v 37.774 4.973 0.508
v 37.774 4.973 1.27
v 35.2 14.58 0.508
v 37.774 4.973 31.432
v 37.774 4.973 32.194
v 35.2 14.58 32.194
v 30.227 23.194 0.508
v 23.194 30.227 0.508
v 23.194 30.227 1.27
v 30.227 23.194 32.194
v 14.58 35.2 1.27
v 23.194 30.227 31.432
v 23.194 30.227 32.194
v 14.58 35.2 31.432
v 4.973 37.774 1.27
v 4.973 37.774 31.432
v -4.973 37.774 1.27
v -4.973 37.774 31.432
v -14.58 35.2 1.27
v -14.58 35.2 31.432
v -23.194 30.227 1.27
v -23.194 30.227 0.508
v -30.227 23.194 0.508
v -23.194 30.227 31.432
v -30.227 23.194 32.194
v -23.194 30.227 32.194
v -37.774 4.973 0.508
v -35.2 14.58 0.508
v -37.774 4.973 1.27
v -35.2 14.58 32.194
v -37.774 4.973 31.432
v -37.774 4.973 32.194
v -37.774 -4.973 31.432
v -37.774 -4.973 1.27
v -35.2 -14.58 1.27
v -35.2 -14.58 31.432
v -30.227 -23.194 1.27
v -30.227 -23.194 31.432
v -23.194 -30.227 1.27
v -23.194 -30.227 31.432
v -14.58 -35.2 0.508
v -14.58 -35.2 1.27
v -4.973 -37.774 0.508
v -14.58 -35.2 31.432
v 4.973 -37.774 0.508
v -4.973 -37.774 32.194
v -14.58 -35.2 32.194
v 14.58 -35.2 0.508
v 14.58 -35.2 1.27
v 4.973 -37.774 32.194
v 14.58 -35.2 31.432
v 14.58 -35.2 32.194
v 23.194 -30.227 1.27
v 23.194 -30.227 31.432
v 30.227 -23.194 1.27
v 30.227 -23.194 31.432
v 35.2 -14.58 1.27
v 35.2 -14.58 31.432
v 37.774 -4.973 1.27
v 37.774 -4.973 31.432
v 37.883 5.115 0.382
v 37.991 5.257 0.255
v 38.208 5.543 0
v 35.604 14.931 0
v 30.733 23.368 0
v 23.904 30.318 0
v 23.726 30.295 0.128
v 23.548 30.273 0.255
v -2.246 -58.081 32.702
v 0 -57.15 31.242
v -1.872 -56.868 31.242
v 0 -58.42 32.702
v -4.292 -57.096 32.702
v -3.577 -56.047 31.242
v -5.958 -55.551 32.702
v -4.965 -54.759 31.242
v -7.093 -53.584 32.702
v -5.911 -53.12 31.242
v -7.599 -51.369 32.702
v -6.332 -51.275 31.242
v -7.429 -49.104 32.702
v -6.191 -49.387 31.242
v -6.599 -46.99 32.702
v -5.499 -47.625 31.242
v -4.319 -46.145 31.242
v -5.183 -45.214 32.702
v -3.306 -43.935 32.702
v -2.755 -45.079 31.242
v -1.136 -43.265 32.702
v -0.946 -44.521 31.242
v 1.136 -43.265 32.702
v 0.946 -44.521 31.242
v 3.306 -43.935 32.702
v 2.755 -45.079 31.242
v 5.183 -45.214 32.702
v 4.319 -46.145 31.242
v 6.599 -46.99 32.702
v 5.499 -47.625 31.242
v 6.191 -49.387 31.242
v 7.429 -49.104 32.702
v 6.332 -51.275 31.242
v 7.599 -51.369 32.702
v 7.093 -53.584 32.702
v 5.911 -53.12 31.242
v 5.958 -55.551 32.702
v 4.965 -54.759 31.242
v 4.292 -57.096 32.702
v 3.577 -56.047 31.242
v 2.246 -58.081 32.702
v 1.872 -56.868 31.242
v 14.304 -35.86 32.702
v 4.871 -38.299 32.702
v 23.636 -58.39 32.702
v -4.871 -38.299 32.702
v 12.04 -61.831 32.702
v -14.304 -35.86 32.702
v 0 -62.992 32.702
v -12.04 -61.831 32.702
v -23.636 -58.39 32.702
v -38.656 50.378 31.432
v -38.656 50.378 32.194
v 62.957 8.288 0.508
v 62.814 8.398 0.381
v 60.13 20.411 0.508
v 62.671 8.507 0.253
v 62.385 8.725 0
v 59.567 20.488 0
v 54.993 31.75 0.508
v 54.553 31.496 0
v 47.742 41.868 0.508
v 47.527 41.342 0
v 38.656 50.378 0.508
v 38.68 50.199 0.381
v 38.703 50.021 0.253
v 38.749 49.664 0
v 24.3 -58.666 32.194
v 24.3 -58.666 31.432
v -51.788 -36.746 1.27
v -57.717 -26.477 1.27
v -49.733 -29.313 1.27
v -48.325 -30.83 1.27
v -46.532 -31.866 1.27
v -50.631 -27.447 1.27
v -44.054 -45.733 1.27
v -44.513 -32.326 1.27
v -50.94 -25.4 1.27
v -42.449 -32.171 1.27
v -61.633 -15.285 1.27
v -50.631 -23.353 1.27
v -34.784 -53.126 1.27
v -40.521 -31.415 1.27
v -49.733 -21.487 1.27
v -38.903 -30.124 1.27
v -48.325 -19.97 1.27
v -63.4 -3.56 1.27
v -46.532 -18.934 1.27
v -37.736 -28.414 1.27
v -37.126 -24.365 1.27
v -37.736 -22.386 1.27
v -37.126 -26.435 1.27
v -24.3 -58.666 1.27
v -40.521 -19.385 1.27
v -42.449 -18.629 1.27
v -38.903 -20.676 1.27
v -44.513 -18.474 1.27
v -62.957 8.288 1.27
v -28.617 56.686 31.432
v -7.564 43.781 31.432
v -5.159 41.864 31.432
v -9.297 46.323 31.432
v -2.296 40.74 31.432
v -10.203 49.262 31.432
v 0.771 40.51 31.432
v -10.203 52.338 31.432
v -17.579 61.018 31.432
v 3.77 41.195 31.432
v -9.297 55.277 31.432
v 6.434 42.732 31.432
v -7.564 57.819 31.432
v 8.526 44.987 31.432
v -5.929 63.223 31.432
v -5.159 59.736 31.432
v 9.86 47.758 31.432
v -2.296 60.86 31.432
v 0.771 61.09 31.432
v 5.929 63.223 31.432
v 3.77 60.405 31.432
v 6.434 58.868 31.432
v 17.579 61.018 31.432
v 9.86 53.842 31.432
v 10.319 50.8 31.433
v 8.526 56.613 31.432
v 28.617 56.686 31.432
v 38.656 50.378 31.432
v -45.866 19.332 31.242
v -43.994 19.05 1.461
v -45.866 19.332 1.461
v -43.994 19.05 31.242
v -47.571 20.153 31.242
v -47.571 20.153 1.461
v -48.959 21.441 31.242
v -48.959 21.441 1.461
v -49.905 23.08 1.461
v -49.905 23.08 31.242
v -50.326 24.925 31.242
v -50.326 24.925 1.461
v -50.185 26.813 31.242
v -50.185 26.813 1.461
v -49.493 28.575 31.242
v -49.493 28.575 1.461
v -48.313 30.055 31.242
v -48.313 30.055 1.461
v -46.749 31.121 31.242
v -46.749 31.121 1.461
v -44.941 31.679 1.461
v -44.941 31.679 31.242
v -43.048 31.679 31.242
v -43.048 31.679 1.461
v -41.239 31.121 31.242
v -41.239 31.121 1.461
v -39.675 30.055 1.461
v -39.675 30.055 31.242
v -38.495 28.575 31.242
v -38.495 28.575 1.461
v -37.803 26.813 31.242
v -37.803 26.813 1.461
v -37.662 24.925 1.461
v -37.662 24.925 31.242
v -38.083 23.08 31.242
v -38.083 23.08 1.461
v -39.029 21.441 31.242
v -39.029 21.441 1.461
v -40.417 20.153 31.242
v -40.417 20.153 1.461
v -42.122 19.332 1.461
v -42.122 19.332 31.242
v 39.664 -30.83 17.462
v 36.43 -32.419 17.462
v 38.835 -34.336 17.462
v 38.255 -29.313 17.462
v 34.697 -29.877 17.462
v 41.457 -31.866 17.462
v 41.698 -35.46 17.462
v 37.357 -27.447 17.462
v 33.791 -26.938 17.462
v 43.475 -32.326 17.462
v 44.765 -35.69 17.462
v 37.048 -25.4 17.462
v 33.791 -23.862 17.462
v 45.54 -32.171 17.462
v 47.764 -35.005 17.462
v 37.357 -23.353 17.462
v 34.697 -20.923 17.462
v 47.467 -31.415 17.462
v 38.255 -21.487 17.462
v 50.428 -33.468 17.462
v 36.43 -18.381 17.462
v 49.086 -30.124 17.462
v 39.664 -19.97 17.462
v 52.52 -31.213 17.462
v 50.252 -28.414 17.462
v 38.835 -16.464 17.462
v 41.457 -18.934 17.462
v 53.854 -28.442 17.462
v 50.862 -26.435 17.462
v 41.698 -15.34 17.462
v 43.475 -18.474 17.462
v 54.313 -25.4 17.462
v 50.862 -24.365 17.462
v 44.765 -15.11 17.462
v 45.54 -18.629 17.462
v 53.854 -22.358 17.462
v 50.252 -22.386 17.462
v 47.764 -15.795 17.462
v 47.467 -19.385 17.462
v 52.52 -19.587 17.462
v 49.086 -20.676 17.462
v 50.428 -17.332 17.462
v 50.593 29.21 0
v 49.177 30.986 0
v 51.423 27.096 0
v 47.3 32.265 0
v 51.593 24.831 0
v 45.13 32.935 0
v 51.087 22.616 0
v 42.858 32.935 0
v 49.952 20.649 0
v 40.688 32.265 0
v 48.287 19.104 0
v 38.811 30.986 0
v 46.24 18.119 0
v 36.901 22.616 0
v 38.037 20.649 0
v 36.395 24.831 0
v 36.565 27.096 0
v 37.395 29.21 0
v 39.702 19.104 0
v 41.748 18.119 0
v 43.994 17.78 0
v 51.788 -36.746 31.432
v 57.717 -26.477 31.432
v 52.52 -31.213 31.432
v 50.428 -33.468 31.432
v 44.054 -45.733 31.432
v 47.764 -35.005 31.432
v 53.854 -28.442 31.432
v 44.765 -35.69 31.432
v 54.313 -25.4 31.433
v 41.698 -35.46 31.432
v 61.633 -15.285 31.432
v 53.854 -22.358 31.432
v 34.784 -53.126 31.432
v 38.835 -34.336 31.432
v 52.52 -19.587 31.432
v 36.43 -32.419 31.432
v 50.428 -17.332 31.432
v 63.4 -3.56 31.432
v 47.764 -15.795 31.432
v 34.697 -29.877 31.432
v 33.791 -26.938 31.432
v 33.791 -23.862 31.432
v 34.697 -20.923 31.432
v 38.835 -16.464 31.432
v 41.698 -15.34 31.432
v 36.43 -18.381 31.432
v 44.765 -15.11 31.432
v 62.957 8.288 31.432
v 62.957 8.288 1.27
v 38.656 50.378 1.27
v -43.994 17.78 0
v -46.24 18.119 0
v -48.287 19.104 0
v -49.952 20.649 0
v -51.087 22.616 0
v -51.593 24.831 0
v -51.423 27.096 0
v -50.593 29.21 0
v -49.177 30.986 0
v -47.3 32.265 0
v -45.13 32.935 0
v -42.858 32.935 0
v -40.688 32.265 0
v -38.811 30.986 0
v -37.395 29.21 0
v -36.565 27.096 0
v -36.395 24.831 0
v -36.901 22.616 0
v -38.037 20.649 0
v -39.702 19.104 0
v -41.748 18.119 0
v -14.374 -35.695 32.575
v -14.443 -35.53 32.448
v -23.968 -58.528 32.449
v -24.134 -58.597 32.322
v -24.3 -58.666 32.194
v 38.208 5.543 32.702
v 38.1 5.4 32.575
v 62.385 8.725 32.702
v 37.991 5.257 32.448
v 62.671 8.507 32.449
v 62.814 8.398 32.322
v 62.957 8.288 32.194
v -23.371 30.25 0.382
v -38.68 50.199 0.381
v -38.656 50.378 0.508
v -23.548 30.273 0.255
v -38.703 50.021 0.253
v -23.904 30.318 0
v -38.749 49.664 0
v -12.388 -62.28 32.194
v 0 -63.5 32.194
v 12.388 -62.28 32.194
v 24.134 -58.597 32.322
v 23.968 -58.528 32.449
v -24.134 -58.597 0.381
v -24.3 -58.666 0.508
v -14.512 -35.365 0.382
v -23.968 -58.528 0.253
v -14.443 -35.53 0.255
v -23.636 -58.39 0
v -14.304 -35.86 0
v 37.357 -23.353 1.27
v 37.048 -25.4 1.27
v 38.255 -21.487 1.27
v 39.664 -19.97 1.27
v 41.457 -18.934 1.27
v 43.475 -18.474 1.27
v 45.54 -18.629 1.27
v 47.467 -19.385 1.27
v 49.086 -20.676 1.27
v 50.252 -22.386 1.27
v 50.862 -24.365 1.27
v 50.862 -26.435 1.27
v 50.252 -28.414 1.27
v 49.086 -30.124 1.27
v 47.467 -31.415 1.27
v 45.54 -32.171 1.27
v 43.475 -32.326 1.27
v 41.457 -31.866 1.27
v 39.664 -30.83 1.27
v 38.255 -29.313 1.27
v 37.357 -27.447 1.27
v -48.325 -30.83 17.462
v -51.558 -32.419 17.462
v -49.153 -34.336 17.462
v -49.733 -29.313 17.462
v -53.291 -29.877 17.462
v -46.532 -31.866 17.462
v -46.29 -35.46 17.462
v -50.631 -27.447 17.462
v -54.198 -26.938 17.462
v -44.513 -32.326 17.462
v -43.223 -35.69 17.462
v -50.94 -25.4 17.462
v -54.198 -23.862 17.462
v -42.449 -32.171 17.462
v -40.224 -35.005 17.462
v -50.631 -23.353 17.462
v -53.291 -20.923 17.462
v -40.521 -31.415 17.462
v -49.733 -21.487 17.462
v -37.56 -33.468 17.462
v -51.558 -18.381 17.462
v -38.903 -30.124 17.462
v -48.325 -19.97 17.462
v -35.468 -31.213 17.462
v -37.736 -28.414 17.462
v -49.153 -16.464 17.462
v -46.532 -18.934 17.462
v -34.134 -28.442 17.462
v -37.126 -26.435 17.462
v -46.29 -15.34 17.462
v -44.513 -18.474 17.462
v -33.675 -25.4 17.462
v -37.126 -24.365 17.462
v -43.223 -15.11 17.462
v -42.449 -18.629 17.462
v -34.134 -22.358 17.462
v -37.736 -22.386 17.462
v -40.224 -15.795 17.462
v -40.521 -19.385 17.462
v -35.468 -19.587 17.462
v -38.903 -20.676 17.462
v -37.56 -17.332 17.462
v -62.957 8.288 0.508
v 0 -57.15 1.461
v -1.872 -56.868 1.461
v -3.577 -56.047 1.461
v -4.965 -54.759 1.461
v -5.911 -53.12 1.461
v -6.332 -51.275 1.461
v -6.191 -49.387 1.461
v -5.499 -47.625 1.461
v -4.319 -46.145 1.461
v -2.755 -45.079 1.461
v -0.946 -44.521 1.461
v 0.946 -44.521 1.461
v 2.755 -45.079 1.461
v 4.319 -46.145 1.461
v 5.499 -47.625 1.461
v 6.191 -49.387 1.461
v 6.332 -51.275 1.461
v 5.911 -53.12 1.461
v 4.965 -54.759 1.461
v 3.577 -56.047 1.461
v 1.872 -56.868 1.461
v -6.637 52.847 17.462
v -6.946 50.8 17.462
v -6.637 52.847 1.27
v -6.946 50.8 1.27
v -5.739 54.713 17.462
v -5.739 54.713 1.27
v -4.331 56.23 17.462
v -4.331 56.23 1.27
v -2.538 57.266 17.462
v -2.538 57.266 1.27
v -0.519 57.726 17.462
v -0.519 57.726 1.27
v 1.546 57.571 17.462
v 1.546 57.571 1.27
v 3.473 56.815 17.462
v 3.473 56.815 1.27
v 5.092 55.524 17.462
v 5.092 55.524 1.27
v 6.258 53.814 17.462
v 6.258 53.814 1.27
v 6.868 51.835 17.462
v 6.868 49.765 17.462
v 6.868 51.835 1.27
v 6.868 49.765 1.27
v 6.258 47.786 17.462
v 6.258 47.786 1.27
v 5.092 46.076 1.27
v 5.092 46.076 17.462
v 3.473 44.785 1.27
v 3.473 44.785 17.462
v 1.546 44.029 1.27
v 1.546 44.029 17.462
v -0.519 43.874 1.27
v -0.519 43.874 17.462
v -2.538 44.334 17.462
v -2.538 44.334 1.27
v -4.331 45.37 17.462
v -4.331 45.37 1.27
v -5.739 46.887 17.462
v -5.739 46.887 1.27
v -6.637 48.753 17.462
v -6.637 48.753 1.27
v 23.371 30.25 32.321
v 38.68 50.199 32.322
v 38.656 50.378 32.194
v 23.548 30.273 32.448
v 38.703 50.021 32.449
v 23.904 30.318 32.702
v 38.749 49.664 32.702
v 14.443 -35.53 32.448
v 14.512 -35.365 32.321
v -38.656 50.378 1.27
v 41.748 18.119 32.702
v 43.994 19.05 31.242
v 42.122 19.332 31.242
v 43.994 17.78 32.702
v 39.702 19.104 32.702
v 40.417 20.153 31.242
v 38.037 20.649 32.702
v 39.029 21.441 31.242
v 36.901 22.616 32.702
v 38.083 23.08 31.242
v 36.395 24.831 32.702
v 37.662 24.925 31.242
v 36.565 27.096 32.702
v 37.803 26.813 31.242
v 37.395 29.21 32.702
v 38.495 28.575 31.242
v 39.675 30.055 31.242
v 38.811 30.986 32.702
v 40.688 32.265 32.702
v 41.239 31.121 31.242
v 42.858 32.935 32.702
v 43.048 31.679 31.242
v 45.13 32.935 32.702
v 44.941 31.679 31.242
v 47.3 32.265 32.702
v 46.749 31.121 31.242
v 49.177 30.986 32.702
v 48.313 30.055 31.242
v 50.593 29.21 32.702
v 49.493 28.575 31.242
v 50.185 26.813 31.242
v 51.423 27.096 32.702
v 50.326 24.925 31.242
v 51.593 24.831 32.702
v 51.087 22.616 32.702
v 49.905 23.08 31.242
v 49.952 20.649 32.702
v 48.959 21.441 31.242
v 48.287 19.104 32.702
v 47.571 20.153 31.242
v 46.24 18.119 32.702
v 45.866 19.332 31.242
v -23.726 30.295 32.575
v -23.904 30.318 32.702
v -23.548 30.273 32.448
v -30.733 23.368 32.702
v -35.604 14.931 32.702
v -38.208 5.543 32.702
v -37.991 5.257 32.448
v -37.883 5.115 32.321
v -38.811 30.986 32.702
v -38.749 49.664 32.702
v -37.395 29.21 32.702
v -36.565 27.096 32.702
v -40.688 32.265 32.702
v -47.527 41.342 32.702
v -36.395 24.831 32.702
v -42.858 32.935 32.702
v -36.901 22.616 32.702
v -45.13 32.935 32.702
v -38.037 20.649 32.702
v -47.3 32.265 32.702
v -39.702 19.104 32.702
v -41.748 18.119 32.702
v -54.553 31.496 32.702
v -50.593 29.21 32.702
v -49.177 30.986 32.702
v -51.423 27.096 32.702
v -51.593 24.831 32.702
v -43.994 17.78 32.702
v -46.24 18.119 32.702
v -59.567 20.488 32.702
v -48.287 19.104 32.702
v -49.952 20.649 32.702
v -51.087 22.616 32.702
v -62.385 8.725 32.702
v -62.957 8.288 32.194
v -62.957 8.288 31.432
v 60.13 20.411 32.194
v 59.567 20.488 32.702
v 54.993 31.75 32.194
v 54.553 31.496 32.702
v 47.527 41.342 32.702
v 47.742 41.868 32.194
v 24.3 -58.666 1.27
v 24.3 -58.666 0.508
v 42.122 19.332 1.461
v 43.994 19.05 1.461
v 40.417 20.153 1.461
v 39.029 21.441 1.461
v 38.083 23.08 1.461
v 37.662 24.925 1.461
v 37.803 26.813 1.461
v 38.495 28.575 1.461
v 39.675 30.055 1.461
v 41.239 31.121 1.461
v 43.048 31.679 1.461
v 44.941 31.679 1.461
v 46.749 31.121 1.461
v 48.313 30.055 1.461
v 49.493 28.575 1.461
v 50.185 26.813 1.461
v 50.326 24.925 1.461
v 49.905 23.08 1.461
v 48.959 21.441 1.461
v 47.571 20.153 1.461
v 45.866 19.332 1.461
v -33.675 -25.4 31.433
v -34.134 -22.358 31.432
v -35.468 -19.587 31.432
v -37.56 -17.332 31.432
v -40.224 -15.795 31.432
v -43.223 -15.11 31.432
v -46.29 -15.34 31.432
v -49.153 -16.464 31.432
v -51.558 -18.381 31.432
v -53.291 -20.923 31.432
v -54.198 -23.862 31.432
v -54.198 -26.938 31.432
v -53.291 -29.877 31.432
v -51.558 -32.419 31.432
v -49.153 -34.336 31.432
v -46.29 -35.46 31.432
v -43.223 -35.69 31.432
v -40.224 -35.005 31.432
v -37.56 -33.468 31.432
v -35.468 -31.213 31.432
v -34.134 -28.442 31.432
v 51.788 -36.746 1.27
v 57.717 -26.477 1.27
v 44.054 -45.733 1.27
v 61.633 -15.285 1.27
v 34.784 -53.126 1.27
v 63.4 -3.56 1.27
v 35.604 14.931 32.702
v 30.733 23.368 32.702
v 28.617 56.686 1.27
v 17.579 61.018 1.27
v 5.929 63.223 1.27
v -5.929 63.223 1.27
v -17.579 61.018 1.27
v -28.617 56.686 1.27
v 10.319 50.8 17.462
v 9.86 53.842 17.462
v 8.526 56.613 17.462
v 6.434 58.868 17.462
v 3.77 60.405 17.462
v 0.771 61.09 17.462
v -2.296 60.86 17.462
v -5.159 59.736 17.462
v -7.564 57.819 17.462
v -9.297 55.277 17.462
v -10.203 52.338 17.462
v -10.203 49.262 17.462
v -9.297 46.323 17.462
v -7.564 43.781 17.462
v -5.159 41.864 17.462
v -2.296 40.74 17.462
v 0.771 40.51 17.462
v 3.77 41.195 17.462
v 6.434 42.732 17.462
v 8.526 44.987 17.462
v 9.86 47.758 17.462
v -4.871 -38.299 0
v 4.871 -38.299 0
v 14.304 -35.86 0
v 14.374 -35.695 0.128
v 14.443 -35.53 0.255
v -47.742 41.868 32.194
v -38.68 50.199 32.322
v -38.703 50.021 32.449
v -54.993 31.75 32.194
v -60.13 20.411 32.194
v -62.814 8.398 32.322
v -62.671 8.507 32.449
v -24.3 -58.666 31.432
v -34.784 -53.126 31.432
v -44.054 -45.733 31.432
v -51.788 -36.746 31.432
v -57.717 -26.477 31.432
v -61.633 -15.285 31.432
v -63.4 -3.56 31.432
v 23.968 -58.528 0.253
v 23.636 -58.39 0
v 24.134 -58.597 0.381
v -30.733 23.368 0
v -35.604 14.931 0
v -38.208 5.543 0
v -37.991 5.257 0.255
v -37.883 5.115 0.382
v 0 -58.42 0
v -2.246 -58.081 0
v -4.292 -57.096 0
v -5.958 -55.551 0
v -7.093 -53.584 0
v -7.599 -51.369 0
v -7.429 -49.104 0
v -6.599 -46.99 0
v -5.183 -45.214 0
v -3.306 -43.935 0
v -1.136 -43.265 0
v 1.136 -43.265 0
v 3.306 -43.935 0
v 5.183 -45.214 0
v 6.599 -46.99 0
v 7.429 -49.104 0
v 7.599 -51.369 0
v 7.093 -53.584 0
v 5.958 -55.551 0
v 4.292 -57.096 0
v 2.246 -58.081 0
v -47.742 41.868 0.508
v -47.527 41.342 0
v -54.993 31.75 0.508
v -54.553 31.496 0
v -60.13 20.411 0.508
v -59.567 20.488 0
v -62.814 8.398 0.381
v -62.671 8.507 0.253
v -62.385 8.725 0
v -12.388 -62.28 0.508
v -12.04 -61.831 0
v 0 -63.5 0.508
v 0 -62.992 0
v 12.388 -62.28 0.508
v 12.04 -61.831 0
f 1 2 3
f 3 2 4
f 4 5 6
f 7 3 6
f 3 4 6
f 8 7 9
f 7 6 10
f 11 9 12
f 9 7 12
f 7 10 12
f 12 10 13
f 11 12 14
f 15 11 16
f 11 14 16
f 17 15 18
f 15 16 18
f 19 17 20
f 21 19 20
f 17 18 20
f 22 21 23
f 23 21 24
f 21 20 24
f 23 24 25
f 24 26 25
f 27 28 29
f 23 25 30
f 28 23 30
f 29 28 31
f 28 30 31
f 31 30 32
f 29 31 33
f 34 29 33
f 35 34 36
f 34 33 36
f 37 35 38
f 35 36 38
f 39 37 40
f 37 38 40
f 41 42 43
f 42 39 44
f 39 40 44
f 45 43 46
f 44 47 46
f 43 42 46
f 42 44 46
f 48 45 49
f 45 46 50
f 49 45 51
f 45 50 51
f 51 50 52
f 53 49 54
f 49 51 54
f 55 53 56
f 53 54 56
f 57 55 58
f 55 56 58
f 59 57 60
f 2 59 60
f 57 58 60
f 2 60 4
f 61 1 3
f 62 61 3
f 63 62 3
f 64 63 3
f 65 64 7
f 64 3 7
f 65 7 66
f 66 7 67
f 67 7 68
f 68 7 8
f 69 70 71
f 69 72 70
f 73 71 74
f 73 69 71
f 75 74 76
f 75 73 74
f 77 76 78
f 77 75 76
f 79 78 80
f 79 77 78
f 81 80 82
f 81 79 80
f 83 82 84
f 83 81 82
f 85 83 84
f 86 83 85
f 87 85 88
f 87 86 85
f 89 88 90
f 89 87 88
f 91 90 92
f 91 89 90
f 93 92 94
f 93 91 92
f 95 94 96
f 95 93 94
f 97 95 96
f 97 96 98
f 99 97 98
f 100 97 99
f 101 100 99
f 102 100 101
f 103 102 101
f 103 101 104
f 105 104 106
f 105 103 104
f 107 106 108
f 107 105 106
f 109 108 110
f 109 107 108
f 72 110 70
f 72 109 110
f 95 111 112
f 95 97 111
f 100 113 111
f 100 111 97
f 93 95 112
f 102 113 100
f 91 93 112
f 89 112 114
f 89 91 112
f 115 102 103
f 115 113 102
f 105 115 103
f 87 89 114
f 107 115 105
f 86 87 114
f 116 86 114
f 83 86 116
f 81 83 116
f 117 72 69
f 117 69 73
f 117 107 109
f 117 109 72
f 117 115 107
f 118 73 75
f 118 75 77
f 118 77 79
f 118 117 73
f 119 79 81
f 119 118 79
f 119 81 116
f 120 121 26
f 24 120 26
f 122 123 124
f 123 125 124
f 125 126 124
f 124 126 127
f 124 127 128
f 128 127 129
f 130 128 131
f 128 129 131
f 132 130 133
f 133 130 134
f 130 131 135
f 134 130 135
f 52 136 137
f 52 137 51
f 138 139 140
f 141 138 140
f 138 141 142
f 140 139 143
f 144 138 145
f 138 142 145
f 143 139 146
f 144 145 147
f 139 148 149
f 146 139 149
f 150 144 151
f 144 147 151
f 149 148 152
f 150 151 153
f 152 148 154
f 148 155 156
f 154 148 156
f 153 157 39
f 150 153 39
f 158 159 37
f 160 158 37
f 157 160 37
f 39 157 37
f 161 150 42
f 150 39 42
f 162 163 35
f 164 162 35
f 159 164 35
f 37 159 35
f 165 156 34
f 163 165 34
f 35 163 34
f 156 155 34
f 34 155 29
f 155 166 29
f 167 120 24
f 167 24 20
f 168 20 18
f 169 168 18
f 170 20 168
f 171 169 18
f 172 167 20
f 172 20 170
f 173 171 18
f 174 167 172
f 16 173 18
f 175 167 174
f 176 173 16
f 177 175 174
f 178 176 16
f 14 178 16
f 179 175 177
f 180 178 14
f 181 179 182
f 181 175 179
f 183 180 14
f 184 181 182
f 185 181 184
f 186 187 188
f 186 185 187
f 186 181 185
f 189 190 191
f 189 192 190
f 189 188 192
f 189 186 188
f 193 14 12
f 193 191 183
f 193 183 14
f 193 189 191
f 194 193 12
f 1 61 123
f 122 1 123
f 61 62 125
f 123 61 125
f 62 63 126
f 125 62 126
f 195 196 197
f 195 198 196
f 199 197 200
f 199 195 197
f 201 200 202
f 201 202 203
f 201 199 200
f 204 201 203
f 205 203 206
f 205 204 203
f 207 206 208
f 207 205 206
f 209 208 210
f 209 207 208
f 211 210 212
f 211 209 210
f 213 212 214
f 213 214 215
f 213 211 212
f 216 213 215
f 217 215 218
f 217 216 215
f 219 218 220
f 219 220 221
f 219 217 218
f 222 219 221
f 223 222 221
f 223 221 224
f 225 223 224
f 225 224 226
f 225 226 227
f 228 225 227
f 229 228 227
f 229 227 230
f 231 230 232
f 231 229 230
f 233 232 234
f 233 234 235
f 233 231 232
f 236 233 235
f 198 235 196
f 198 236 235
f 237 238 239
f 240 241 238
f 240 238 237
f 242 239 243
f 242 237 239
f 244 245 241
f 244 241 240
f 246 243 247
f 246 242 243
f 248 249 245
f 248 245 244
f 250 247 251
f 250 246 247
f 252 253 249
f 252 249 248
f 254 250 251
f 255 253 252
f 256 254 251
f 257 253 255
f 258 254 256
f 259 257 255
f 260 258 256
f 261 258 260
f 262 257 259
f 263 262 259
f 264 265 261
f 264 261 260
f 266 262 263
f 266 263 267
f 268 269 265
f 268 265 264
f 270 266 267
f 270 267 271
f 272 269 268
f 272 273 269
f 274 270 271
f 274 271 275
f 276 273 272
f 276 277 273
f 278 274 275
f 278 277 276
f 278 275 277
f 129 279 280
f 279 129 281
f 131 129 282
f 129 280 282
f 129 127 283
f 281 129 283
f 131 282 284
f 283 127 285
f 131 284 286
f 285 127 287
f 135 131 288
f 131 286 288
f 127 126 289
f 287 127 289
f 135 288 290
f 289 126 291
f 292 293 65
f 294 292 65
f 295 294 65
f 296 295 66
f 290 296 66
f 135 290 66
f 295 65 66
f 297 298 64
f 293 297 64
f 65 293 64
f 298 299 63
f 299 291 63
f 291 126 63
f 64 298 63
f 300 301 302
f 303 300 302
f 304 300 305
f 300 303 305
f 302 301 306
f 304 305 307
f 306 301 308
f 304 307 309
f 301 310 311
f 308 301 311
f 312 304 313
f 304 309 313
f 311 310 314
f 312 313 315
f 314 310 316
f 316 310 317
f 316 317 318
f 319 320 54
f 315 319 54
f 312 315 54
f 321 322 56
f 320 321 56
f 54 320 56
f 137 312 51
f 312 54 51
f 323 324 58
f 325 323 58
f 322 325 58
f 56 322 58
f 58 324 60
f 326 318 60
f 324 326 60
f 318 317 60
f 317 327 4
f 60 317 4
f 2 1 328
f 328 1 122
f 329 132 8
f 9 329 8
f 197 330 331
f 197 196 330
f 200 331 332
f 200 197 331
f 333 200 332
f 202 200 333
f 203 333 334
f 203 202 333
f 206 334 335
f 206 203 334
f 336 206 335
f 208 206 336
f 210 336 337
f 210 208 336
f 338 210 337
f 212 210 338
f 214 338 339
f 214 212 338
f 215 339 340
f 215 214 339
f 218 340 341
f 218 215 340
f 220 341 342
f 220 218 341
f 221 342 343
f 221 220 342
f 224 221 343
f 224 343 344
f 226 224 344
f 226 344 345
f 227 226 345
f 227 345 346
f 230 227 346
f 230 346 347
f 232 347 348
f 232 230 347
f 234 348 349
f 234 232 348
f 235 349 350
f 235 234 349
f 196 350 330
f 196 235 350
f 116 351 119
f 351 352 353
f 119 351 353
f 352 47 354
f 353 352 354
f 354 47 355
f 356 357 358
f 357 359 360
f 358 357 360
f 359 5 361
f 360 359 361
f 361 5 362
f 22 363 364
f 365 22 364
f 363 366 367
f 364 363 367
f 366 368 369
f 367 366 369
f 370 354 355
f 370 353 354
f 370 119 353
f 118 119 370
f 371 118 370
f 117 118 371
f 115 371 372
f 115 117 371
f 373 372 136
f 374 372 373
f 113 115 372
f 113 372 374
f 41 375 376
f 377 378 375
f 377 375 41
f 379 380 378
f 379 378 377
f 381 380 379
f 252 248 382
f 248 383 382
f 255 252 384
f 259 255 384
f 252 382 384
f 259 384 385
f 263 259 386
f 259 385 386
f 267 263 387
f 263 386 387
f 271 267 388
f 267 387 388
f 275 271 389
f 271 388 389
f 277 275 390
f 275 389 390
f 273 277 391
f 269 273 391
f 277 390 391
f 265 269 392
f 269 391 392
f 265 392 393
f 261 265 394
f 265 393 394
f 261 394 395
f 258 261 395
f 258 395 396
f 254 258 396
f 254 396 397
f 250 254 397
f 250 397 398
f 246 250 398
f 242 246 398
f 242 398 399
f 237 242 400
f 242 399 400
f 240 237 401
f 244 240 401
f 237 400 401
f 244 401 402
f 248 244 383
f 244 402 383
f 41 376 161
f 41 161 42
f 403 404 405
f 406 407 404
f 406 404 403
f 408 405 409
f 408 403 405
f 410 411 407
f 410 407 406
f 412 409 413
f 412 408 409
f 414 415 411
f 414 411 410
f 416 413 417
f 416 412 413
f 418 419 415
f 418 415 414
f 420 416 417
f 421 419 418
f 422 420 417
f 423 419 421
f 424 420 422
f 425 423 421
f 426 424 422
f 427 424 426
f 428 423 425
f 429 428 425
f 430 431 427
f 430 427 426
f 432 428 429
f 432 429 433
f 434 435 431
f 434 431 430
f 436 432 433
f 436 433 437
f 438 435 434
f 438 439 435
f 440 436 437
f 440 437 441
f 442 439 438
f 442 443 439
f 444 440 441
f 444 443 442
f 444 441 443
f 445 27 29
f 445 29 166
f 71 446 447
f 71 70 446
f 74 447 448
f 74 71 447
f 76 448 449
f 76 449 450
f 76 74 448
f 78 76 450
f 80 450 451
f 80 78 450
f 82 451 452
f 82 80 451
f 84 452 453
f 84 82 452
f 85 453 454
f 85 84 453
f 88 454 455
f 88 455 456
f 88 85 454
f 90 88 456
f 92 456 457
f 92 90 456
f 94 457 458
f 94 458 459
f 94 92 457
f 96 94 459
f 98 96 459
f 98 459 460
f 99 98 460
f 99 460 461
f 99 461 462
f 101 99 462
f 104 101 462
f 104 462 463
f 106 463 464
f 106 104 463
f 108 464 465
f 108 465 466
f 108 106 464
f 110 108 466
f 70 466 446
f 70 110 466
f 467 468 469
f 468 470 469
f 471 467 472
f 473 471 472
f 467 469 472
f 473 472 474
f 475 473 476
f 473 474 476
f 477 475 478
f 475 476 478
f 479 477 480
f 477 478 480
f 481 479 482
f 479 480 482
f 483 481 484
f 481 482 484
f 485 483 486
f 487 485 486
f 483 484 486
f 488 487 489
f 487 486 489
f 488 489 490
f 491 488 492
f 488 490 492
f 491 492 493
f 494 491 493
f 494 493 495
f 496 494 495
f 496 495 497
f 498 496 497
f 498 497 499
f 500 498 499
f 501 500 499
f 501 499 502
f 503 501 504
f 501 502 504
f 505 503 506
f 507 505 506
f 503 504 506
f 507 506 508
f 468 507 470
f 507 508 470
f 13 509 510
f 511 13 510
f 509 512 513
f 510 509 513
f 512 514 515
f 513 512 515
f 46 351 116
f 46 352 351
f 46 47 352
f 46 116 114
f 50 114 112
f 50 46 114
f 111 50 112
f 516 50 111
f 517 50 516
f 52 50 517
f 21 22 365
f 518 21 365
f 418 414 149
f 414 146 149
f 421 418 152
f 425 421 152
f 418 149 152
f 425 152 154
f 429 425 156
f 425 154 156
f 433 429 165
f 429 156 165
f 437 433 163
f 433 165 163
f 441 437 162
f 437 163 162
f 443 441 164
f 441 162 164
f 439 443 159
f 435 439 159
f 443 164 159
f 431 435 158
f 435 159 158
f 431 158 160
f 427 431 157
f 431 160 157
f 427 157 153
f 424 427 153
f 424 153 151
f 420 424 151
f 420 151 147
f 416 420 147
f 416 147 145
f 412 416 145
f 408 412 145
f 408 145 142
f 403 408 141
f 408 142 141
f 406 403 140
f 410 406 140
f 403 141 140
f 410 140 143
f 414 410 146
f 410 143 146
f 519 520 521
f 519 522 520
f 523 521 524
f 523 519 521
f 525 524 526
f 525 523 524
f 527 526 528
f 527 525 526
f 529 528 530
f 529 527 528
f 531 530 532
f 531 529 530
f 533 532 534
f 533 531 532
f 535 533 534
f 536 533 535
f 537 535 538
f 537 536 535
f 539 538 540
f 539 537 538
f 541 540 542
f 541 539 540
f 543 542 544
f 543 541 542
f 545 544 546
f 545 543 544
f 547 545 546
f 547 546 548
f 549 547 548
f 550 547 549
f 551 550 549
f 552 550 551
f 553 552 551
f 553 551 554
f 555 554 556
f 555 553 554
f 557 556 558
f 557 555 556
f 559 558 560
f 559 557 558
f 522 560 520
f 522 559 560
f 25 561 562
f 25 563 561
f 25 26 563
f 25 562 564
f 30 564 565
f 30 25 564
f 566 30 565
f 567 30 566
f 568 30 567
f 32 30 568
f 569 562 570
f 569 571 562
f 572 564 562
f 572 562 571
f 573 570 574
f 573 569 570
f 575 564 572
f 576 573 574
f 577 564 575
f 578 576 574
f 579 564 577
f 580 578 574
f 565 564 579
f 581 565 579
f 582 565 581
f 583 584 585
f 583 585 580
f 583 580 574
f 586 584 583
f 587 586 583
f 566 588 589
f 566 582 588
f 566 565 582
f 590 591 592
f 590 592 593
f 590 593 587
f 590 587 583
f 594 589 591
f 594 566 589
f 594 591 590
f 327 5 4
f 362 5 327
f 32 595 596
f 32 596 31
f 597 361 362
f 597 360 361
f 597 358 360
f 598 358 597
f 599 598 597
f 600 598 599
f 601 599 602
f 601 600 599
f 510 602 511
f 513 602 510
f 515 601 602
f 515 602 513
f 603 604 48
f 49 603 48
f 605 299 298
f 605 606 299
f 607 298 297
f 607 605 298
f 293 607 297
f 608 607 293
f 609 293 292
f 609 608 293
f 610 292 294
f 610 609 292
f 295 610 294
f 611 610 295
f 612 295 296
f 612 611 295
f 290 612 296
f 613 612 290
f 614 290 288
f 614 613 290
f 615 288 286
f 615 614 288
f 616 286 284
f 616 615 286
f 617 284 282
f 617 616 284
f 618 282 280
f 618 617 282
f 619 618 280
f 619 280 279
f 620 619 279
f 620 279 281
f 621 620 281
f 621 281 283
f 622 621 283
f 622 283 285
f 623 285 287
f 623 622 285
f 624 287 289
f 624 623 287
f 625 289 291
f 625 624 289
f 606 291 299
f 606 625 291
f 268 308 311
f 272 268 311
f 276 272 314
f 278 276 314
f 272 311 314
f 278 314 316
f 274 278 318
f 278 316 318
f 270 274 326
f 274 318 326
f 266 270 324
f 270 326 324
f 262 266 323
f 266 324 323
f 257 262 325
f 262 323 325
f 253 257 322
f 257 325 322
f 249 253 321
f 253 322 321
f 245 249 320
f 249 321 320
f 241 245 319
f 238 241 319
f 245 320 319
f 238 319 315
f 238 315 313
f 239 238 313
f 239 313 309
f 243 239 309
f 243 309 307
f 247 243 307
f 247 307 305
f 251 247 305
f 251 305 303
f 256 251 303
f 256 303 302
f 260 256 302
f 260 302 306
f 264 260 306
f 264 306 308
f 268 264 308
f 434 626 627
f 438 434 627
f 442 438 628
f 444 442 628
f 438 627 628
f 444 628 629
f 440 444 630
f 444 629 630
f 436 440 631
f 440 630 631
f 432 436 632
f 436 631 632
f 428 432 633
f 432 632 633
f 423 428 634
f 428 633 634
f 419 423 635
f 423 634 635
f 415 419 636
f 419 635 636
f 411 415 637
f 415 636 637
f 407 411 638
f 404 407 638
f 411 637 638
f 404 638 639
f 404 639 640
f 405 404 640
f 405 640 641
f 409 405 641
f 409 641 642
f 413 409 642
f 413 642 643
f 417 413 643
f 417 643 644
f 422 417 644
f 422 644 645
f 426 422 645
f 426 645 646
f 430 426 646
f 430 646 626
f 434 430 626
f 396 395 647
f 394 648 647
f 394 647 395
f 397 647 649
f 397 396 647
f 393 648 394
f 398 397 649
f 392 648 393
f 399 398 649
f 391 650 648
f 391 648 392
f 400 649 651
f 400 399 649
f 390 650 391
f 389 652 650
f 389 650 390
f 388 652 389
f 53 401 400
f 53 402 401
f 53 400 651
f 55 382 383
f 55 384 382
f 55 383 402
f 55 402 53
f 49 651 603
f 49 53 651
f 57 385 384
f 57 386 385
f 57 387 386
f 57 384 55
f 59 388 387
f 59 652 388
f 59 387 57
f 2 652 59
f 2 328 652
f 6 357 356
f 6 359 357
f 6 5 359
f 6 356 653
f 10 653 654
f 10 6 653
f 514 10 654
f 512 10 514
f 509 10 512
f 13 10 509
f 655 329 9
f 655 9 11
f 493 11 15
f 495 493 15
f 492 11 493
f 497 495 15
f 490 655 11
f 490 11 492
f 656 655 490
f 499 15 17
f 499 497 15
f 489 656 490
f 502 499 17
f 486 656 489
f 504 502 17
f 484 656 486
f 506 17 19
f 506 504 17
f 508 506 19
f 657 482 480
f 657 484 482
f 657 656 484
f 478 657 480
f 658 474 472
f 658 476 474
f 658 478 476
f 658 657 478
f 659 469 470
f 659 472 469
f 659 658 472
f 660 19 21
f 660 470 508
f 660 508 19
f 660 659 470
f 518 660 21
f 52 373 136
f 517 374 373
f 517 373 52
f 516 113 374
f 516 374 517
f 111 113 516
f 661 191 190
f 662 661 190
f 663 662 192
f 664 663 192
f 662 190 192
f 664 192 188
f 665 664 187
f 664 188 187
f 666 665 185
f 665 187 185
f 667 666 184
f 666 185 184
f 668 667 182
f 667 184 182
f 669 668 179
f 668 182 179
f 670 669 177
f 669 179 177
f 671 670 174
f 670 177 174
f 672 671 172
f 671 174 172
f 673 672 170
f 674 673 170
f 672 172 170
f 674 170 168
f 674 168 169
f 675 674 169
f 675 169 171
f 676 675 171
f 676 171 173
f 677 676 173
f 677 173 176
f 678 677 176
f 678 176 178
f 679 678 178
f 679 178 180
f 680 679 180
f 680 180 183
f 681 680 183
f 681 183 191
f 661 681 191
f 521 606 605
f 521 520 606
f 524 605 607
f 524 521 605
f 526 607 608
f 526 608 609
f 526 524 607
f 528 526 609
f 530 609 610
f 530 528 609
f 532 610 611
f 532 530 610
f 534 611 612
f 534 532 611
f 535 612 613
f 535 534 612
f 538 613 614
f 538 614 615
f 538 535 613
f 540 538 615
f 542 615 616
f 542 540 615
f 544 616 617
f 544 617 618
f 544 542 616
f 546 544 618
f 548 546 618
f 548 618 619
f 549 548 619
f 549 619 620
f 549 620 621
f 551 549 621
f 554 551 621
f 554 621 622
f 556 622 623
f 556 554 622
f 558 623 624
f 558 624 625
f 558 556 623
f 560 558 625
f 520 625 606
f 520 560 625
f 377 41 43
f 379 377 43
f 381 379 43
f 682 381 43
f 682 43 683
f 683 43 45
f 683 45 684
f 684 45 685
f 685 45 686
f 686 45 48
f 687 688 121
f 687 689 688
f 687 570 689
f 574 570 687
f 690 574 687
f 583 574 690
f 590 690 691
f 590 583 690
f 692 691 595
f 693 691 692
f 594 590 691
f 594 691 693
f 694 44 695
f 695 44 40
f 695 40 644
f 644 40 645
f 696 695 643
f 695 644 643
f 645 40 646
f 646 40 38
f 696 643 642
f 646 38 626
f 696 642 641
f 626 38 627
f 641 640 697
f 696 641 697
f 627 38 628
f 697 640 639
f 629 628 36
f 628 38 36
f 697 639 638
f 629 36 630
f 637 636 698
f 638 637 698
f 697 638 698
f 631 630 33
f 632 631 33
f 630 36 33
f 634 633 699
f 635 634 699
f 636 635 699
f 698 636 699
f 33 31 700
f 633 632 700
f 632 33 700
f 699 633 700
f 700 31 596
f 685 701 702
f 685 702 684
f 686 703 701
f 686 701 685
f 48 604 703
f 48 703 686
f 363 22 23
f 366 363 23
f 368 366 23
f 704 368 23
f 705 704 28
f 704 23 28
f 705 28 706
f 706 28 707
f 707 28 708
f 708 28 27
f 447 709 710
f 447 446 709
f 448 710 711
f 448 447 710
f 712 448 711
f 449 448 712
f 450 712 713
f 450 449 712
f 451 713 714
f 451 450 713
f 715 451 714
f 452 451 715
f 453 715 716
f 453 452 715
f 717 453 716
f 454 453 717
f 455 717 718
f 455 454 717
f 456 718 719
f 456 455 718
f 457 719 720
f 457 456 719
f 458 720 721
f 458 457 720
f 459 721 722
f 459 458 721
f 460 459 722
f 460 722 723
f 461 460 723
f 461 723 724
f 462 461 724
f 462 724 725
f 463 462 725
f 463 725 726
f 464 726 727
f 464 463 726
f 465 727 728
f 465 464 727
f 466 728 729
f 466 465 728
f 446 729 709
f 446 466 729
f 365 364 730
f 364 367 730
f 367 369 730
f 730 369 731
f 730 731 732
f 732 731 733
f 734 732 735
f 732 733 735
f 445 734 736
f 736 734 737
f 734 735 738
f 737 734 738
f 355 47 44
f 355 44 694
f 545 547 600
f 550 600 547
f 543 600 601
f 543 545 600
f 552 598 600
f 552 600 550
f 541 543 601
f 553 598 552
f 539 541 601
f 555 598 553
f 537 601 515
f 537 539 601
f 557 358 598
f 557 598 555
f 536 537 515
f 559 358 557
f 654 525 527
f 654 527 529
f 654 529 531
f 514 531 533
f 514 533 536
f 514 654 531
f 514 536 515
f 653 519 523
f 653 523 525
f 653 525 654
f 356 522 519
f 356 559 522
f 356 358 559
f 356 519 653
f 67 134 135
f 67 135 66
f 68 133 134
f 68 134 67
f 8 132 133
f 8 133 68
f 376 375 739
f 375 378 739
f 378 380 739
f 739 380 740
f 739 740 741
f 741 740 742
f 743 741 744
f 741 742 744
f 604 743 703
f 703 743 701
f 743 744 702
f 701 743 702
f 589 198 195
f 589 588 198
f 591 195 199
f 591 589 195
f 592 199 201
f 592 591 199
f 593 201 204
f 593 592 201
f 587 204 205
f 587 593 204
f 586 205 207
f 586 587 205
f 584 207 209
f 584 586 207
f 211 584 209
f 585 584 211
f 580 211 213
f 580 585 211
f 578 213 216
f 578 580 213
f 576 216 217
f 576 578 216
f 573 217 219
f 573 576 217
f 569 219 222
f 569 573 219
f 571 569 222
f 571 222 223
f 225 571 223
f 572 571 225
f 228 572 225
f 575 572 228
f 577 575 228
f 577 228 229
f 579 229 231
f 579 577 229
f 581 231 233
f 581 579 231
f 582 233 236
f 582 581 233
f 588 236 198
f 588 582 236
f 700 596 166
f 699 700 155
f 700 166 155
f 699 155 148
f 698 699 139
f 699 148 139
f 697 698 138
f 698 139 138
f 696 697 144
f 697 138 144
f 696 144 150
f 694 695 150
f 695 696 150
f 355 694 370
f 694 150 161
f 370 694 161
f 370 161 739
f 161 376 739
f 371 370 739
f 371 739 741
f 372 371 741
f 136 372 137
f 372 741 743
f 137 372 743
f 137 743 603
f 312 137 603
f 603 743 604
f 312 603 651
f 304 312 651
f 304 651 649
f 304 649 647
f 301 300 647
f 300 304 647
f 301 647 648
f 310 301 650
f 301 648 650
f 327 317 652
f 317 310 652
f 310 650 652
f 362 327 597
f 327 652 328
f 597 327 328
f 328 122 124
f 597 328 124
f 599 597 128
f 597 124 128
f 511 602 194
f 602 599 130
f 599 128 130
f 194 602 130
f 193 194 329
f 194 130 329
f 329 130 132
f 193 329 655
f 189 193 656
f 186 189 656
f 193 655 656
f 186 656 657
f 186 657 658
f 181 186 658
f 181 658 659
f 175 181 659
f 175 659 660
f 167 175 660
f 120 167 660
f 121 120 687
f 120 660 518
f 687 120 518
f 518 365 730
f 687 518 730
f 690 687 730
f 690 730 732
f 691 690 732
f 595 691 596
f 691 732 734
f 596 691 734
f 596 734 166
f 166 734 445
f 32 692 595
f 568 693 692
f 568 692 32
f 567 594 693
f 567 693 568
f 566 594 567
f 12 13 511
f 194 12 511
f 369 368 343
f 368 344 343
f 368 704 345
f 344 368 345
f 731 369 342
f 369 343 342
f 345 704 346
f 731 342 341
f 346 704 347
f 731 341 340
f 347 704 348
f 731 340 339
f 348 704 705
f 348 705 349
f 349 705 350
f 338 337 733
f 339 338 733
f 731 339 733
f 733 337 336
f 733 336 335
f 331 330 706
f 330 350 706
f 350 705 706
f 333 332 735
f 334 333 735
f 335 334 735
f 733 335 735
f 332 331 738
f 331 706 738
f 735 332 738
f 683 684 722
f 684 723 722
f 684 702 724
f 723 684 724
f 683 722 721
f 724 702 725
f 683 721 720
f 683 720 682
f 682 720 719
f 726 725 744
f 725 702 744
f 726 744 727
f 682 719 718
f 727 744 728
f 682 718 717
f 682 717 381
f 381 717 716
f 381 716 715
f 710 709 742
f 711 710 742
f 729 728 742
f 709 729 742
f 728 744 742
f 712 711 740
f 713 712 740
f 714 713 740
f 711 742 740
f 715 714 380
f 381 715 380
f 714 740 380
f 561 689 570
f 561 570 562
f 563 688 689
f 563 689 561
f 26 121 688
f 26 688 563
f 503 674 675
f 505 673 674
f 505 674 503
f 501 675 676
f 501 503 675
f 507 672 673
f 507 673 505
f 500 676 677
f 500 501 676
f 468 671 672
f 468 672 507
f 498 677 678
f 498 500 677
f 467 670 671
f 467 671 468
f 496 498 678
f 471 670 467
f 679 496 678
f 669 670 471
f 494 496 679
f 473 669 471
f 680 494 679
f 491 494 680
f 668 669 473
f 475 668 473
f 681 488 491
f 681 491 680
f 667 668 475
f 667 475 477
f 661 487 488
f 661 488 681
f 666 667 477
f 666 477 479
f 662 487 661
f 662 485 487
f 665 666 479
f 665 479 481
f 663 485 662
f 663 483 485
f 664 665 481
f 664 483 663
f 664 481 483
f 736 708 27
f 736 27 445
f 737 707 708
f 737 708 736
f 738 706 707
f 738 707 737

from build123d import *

# Parameters (mm, degrees)
SKETCH1_R                                        = 63.5
EXTRUDE1_DEPTH                                   = 32.7025
SKETCH2_R                                        = 38.1
CUT_EXTRUDE1_DEPTH                               = 33.7025
CUT_EXTRUDE2_DEPTH                               = 1.27
CUT_EXTRUDE3_DEPTH                               = 1.27
CBORE_FOR_1_2_SOCKET_HEAD_CAP_SCREW1_D           = 13.89126
CBORE_FOR_1_2_SOCKET_HEAD_CAP_SCREW1_CBORE_D     = 20.6375
CBORE_FOR_1_2_SOCKET_HEAD_CAP_SCREW1_CBORE_DEPTH = 13.97
F_1_2_20_TAPPED_HOLE1_AT_2_COUNT                 = 2
F_1_2_20_TAPPED_HOLE1_AT_2_PITCH                 = 87.988181024
F_1_2_20_TAPPED_HOLE1_AT_3_COUNT                 = 2
F_1_2_20_TAPPED_HOLE1_AT_3_PITCH                 = 87.988181024
CHAMFER1_SIZE                                    = 0.508


with BuildPart() as part:
    # Sketch1 → Extrude1 (new body)
    with BuildSketch(Plane.XY):
        with Locations(Location((0, 0, 0), (0, 0, 172.5))):  # turned: the seam where the file's is
            Circle(SKETCH1_R)
    extrude(amount=EXTRUDE1_DEPTH)

    # Sketch2 → Cut-Extrude1 (cut, through all)
    with BuildSketch(Plane.XY.offset(32.7025)):
        with Locations(Location((0, 0, 0), (0, 0, 7.5))):  # turned: the seam where the file's is
            Circle(SKETCH2_R)
    extrude(amount=-CUT_EXTRUDE1_DEPTH, mode=Mode.SUBTRACT)

    # Sketch3 → Cut-Extrude2 (cut)
    with BuildSketch(Plane.XY.offset(32.7025)):
        with BuildLine():
            Line((-38.656350742, 50.377937108), (-23.193810445, 30.226762265))
            ThreePointArc((-23.193810445, 30.226762265), (0, 38.1), (23.193810445, 30.226762265))
            Line((23.193810445, 30.226762265), (38.656350742, 50.377937108))
            ThreePointArc((38.656350742, 50.377937108), (0, 63.5), (-38.656350742, 50.377937108))
        make_face()
        with BuildLine():
            Line((-62.956748697, 8.288413206), (-37.774049218, 4.973047924))
            ThreePointArc((-37.774049218, 4.973047924), (-32.995567884, -19.05), (-14.580238773, -35.199810189))
            Line((-14.580238773, -35.199810189), (-24.300397955, -58.666350314))
            ThreePointArc((-24.300397955, -58.666350314), (-54.99261314, -31.75), (-62.956748697, 8.288413206))
        make_face()
        with BuildLine():
            Line((24.300397955, -58.666350314), (14.580238773, -35.199810189))
            ThreePointArc((14.580238773, -35.199810189), (32.995567884, -19.05), (37.774049218, 4.973047924))
            Line((37.774049218, 4.973047924), (62.956748697, 8.288413206))
            ThreePointArc((62.956748697, 8.288413206), (54.99261314, -31.75), (24.300397955, -58.666350314))
        make_face()
    extrude(amount=-CUT_EXTRUDE2_DEPTH, mode=Mode.SUBTRACT)

    # Sketch4 → Cut-Extrude3 (cut)
    with BuildSketch(Plane(origin=(0, 0, 0), x_dir=(-1, 0, 0), z_dir=(0, 0, -1))):
        with BuildLine():
            Line((24.300397955, -58.666350314), (14.580238773, -35.199810189))
            ThreePointArc((14.580238773, -35.199810189), (32.995567884, -19.05), (37.774049218, 4.973047924))
            Line((37.774049218, 4.973047924), (62.956748697, 8.288413206))
            ThreePointArc((62.956748697, 8.288413206), (54.99261314, -31.75), (24.300397955, -58.666350314))
        make_face()
        with BuildLine():
            Line((-24.300397955, -58.666350314), (-14.580238773, -35.199810189))
            ThreePointArc((-14.580238773, -35.199810189), (-32.995567884, -19.05), (-37.774049218, 4.973047924))
            Line((-37.774049218, 4.973047924), (-62.956748697, 8.288413206))
            ThreePointArc((-62.956748697, 8.288413206), (-54.99261314, -31.75), (-24.300397955, -58.666350314))
        make_face()
        with BuildLine():
            Line((-38.656350742, 50.377937108), (-23.193810445, 30.226762265))
            ThreePointArc((-23.193810445, 30.226762265), (0, 38.1), (23.193810445, 30.226762265))
            Line((23.193810445, 30.226762265), (38.656350742, 50.377937108))
            ThreePointArc((38.656350742, 50.377937108), (0, 63.5), (-38.656350742, 50.377937108))
        make_face()
    extrude(amount=-CUT_EXTRUDE3_DEPTH, mode=Mode.SUBTRACT)

    # CBORE for 1_2 Socket Head Cap Screw1 (through all)
    with Locations(Plane.XY.offset(31.4325)):
        with Locations((-43.994090512, -25.4), (0, 50.8), (43.994090512, -25.4)):
            CounterBoreHole(CBORE_FOR_1_2_SOCKET_HEAD_CAP_SCREW1_D / 2, CBORE_FOR_1_2_SOCKET_HEAD_CAP_SCREW1_CBORE_D / 2, CBORE_FOR_1_2_SOCKET_HEAD_CAP_SCREW1_CBORE_DEPTH)

    # Sketch9 → 1_2-20 Tapped Hole1 (revolve, cut)
    with BuildSketch(Plane(origin=(0, -50.8, 32.7025), x_dir=(0, -1, 0), z_dir=(1, 0, 0))):
        Polygon((0, 0), (0, 32.7025), (7.62, 32.7025), (6.35, 31.241532123), (6.35, 1.460967877), (7.62, 0), align=None)
    f_1_2_20_tapped_hole1 = revolve(axis=Axis((0, -50.8, 39.0525), (0, 0, -1)), mode=Mode.SUBTRACT)

    # 1_2-20 Tapped Hole1 at 2: 1_2-20 Tapped Hole1 ×2
    with Locations(*[Vector(-0.5, 0.866025404, 0) * (i * F_1_2_20_TAPPED_HOLE1_AT_2_PITCH) for i in range(1, F_1_2_20_TAPPED_HOLE1_AT_2_COUNT)]):
        add(f_1_2_20_tapped_hole1, mode=Mode.SUBTRACT)

    # 1_2-20 Tapped Hole1 at 3: 1_2-20 Tapped Hole1 ×2
    with Locations(*[Vector(0.5, 0.866025404, 0) * (i * F_1_2_20_TAPPED_HOLE1_AT_3_PITCH) for i in range(1, F_1_2_20_TAPPED_HOLE1_AT_3_COUNT)]):
        add(f_1_2_20_tapped_hole1, mode=Mode.SUBTRACT)

    # Chamfer1
    chamfer1_edges = [part.edges().sort_by_distance(p)[0] for p in [
        (-54.99261314, 31.75, 32.7025),
        (54.99261314, 31.75, 32.7025),
        (0, -63.5, 32.7025),
        (0, -63.5, 0),
        (54.99261314, 31.75, 0),
        (-54.99261314, 31.75, 0),
        (-50.365398958, 6.630730565, 0),
        (-50.365398958, 6.630730565, 32.7025),
        (-30.925080594, 40.302349687, 32.7025),
        (-32.995567884, 19.05, 32.7025),
        (30.925080594, 40.302349687, 32.7025),
        (50.365398958, 6.630730565, 32.7025),
        (32.995567884, 19.05, 32.7025),
        (19.440318364, -46.933080252, 32.7025),
        (-19.440318364, -46.933080252, 32.7025),
        (0, -38.1, 32.7025),
        (-19.440318364, -46.933080252, 0),
        (0, -38.1, 0),
        (19.440318364, -46.933080252, 0),
        (50.365398958, 6.630730565, 0),
        (30.925080594, 40.302349687, 0),
        (32.995567884, 19.05, 0),
        (-30.925080594, 40.302349687, 0),
        (-32.995567884, 19.05, 0),
    ]]
    chamfer(chamfer1_edges, length=CHAMFER1_SIZE)


solid = part.part
